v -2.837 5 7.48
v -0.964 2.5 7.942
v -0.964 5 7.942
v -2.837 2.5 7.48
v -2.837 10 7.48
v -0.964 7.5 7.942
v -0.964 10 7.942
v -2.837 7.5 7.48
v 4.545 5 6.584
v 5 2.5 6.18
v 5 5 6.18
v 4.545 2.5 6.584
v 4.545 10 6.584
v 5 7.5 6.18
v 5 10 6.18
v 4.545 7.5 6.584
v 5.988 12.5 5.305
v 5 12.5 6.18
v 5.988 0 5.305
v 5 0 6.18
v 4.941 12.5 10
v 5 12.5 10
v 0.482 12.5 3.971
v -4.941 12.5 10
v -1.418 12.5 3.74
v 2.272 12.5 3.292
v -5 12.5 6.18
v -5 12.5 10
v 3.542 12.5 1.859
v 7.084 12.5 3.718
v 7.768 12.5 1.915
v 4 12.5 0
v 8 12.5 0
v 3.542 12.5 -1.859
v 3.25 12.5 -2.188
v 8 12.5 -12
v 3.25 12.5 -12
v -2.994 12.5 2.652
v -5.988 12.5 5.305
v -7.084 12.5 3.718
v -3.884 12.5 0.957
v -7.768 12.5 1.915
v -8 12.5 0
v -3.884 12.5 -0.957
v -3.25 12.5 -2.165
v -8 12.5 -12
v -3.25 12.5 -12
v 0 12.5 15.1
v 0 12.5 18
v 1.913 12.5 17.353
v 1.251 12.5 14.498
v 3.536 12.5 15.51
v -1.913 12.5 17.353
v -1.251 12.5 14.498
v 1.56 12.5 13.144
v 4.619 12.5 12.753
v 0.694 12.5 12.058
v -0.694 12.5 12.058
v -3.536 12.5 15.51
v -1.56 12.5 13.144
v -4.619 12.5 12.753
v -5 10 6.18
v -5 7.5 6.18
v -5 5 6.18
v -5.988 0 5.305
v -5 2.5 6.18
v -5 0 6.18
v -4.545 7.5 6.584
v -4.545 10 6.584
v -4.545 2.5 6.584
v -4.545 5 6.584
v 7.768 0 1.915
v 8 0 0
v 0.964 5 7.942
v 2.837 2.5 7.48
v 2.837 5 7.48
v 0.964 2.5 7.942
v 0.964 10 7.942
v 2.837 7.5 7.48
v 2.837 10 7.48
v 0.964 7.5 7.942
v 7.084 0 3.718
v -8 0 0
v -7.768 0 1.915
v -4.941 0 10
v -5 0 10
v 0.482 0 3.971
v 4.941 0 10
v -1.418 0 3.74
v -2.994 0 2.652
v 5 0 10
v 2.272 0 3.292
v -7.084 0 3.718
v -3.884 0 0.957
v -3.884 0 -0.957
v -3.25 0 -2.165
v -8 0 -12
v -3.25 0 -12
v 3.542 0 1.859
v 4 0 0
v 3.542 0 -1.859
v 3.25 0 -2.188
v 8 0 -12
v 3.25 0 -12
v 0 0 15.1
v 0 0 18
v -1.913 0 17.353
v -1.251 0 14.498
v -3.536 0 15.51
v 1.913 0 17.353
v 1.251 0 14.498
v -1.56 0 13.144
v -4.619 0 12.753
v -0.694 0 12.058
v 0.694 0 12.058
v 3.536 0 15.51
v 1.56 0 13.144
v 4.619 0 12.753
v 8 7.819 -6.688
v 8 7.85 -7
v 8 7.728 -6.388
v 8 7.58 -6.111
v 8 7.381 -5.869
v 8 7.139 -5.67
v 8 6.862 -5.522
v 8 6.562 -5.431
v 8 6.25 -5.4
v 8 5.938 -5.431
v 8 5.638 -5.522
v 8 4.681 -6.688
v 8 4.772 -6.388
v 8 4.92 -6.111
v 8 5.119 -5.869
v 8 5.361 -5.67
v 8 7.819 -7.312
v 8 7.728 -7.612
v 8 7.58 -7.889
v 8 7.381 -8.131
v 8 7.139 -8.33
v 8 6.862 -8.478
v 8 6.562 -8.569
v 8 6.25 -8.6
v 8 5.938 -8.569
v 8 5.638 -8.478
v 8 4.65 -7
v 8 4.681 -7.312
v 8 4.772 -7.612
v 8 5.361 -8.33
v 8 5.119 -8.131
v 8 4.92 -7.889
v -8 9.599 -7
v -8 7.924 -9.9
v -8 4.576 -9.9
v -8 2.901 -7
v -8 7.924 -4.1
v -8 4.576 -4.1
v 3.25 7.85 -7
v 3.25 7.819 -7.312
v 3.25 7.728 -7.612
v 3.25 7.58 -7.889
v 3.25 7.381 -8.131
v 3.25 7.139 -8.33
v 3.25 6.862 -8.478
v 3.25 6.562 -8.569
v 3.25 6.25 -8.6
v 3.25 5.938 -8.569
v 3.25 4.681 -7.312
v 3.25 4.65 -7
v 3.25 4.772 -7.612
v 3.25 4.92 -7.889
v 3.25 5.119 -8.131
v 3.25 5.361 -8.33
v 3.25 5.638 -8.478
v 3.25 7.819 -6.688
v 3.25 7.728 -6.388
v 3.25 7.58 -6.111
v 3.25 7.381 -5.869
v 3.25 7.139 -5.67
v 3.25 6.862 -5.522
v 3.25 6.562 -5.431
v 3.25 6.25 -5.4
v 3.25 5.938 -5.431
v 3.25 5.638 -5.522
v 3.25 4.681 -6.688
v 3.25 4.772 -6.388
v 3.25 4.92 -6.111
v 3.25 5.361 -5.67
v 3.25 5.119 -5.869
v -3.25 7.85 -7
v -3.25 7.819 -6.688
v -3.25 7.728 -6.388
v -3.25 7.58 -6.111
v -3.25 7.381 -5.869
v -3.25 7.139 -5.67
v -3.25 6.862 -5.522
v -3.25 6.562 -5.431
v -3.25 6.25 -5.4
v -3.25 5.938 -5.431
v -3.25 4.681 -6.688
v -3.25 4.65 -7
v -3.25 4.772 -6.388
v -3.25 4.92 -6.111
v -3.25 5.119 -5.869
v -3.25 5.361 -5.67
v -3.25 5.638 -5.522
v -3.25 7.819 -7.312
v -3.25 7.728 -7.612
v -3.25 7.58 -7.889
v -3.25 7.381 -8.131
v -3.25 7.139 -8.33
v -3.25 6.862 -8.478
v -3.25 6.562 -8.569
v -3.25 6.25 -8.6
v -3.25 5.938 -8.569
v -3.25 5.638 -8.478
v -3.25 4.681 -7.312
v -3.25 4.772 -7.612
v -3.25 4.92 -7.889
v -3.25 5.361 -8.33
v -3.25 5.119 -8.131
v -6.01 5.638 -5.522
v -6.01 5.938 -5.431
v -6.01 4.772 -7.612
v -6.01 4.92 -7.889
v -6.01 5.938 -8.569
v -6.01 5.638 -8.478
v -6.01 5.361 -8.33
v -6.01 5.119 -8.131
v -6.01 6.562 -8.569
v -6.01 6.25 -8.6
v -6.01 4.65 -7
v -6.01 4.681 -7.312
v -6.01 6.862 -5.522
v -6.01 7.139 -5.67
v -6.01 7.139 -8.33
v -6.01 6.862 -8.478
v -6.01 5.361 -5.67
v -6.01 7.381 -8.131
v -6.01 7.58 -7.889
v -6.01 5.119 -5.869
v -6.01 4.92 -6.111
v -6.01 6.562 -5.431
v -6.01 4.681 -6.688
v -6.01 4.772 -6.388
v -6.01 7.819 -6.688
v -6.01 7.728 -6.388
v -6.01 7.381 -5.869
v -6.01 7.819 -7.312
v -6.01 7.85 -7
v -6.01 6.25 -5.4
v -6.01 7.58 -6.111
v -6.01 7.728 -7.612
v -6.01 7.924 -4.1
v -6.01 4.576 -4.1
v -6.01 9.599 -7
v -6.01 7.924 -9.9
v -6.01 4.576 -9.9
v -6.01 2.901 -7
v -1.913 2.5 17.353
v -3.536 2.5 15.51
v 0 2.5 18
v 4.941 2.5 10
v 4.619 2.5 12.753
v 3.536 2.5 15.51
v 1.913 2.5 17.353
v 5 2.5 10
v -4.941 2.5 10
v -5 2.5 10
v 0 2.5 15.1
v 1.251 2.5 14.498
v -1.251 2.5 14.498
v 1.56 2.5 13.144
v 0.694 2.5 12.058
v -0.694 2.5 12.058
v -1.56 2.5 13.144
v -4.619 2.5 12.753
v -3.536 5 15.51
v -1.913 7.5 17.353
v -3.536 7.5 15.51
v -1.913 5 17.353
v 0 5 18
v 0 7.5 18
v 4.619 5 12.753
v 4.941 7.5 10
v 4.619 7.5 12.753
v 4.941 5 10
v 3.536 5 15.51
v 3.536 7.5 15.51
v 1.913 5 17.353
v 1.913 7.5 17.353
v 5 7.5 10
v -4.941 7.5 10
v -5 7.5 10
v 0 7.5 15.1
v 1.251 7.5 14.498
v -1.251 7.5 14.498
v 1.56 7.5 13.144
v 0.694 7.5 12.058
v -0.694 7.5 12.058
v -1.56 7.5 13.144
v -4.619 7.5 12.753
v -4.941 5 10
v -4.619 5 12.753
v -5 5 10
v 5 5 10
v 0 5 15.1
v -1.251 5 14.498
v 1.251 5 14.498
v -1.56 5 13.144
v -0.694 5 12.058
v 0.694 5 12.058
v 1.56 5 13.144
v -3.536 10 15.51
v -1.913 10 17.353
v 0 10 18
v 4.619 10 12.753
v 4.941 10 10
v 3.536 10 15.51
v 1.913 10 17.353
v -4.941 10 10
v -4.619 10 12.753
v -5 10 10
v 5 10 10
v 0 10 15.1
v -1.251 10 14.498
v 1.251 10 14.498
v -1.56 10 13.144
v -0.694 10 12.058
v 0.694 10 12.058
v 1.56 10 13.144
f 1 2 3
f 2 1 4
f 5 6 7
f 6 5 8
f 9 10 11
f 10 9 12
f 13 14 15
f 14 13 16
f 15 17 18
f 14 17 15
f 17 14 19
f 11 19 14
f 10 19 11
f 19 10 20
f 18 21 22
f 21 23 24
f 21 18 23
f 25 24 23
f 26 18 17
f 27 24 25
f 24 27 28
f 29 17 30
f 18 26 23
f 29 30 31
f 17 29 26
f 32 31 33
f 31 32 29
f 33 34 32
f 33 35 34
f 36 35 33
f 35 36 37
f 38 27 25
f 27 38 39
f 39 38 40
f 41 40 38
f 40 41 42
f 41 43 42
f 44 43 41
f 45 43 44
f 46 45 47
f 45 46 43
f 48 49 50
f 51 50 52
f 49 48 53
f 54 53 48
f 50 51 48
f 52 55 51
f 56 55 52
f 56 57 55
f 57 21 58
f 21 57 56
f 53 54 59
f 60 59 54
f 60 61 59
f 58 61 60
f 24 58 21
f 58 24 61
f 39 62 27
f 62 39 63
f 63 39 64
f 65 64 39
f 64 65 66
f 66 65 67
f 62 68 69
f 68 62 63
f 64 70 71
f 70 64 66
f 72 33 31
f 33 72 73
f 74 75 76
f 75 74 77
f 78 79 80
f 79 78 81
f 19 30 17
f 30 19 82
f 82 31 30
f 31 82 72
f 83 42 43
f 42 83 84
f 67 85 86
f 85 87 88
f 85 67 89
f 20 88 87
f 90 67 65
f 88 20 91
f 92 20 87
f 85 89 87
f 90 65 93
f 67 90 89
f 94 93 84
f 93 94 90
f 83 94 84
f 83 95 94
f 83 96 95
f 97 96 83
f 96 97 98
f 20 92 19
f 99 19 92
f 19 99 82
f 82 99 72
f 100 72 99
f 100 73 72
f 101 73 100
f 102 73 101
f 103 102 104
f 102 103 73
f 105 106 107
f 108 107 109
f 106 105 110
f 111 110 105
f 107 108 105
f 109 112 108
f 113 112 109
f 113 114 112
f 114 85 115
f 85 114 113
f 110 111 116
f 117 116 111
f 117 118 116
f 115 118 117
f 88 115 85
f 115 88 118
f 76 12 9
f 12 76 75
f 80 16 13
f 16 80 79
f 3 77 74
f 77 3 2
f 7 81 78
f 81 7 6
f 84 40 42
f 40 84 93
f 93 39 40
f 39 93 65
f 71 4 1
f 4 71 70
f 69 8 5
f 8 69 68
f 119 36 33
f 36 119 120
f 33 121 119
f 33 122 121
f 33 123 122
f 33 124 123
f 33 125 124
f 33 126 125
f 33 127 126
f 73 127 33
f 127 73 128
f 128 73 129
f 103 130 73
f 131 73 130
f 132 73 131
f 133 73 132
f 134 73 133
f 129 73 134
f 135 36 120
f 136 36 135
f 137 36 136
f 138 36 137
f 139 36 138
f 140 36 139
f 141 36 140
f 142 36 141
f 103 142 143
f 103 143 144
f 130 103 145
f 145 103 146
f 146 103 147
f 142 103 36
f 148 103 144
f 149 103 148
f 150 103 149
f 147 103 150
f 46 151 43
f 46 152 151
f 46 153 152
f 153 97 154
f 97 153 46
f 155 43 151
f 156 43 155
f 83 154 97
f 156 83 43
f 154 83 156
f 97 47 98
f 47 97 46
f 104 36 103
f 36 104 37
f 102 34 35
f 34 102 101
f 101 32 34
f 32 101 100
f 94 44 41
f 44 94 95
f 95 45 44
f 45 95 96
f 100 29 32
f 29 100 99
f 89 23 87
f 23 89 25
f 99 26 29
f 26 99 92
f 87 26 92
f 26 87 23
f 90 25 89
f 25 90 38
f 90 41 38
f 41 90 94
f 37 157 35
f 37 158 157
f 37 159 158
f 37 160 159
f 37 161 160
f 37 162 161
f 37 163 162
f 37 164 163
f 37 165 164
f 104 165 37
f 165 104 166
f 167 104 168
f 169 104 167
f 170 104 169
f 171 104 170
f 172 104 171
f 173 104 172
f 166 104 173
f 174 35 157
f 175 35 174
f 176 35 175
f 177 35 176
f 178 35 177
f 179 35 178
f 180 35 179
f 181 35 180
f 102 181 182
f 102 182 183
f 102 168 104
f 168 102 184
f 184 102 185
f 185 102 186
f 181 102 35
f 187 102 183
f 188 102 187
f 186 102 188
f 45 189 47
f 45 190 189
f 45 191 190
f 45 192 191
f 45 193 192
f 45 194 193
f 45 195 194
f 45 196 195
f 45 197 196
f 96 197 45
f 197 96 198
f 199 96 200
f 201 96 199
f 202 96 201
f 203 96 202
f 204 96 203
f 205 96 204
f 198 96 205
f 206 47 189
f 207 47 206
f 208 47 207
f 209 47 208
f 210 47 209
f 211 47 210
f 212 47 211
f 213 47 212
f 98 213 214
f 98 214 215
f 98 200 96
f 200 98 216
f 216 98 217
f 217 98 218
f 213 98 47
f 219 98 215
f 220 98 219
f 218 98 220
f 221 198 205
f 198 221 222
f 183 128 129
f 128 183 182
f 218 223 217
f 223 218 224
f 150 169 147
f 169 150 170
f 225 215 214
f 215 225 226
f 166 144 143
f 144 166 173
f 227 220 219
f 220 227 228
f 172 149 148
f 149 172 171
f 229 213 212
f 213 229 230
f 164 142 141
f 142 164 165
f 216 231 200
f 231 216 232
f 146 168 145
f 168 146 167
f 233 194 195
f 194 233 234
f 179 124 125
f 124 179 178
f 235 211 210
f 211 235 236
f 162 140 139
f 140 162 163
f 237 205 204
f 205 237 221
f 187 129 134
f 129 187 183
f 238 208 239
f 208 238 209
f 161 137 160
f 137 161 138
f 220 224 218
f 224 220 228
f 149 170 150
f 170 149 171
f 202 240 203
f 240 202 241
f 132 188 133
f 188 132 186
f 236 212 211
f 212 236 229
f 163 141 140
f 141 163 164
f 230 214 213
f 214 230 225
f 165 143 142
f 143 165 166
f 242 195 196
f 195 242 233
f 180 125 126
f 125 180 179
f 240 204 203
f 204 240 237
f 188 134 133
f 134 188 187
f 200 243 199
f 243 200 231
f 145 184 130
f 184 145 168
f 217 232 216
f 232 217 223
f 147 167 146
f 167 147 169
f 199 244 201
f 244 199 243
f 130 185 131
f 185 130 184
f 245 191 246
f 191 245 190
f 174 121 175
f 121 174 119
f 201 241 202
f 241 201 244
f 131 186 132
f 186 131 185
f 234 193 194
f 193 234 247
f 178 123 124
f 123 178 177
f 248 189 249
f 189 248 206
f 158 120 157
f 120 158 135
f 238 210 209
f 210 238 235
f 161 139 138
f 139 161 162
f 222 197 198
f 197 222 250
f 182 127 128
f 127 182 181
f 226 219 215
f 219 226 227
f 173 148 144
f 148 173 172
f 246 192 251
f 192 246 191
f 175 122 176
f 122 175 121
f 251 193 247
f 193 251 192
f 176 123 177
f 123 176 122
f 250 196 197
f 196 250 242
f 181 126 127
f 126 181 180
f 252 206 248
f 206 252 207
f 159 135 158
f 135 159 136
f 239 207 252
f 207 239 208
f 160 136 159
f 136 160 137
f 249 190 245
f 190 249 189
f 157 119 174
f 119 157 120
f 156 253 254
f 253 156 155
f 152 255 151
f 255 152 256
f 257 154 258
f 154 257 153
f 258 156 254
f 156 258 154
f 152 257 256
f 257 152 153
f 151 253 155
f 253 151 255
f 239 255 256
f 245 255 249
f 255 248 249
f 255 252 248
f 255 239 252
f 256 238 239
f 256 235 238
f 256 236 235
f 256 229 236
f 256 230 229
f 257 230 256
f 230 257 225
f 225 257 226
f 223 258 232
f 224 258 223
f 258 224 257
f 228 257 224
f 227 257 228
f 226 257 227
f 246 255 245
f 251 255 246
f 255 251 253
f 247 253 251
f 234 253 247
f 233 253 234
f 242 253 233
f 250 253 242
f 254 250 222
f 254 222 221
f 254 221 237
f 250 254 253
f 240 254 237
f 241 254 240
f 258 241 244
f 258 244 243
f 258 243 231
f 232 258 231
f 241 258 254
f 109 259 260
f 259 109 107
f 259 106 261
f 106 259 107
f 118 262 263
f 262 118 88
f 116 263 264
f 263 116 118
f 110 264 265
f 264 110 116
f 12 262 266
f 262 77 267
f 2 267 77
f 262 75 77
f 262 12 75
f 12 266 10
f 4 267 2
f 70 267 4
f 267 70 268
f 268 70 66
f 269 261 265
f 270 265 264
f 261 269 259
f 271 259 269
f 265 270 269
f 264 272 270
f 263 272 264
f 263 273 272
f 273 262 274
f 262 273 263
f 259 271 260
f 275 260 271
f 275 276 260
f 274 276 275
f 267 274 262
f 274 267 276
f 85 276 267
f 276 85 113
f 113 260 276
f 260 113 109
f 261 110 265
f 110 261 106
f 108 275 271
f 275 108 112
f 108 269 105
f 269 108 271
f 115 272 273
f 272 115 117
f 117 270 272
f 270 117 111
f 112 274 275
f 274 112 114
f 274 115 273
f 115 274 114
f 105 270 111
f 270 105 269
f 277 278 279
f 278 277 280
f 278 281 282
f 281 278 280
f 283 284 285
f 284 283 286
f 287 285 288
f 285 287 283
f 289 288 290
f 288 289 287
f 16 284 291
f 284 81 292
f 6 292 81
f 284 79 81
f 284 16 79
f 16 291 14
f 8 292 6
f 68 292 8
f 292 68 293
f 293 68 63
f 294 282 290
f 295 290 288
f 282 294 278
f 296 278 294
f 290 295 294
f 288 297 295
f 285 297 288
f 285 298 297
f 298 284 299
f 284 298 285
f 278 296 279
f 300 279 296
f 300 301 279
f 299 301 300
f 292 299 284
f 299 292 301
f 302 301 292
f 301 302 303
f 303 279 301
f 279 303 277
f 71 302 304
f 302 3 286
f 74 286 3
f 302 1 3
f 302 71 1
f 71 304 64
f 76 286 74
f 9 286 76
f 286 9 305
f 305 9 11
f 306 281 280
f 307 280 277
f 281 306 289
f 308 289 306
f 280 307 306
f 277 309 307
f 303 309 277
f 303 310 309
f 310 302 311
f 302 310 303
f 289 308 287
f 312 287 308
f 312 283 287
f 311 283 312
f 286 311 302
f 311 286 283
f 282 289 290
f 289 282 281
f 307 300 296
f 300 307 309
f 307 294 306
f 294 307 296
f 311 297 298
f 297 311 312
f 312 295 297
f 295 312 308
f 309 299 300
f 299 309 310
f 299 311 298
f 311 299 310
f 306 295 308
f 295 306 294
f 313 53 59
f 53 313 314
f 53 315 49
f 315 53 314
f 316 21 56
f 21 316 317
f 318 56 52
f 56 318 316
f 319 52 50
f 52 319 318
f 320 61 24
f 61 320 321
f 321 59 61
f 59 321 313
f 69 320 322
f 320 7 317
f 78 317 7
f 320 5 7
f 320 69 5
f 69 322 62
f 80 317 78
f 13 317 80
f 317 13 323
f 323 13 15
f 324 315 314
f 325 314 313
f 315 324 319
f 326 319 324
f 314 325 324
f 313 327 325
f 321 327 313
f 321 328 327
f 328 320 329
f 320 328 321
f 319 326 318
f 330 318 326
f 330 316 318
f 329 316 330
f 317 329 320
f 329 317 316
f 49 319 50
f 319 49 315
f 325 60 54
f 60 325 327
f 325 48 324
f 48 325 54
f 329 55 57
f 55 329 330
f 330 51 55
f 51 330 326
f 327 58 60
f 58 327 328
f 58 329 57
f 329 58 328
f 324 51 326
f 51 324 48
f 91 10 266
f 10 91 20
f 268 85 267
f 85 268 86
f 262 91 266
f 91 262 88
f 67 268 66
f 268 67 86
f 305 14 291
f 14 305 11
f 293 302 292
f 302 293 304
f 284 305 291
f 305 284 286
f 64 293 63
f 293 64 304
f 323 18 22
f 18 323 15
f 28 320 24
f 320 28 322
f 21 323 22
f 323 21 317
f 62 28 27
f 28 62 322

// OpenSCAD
// file: connector.scad
module connector(w=2.5) {
  translate([1.5, w, 5])
  difference() {
    rotate([90])
      scale([1.7,1])
      cylinder(r=5, h=w);
    rotate([90])
      translate([4,0])
      cylinder(r=1.6, h=w, $fn=7);
    translate([-11.5, -3, -5])
    cube([10,4,10]);
  }
}

module connectors() {
  connector();
  translate([0, 5]) connector();
  translate([0, 10]) connector();
}

connector();
// main file
use <connector.scad>;

bore=8;
height=12.5;
wall=4;
length=12;
hole_dist=7;

rotate(a=[270,0,0]) {
difference(){
	union(){
		cylinder(h=height,r=(bore/2)+wall);
		translate([0,length/2,height/2]) cube([bore+2*wall,length,height],center=true);
	}
	cylinder(h=height, r=bore/2);
	translate([0,length/2,height/2]) cube([bore-1.5,length,height], center=true);
	translate([0,hole_dist,height/2]) rotate([0,90,0]) cylinder(h=bore+2*wall+09.1,r=3.2/2, center=true, $fn=32);
	#translate([-bore/2-wall-0.01,hole_dist,height/2]) rotate([0,90,0]) cylinder(h=2,r=5.8/sqrt(3), $fn=6);
}
}

translate([5,0,bore]) rotate(a=[0,270,0]) {
	connectors();
}

translate([-5,0,bore/2]) cube([10,2.5,bore/2 + 2]);
translate([-5,5,bore/2]) cube([10,2.5,bore/2 + 2]);
translate([-5,10,bore/2]) cube([10,2.5,bore/2 + 2]);
